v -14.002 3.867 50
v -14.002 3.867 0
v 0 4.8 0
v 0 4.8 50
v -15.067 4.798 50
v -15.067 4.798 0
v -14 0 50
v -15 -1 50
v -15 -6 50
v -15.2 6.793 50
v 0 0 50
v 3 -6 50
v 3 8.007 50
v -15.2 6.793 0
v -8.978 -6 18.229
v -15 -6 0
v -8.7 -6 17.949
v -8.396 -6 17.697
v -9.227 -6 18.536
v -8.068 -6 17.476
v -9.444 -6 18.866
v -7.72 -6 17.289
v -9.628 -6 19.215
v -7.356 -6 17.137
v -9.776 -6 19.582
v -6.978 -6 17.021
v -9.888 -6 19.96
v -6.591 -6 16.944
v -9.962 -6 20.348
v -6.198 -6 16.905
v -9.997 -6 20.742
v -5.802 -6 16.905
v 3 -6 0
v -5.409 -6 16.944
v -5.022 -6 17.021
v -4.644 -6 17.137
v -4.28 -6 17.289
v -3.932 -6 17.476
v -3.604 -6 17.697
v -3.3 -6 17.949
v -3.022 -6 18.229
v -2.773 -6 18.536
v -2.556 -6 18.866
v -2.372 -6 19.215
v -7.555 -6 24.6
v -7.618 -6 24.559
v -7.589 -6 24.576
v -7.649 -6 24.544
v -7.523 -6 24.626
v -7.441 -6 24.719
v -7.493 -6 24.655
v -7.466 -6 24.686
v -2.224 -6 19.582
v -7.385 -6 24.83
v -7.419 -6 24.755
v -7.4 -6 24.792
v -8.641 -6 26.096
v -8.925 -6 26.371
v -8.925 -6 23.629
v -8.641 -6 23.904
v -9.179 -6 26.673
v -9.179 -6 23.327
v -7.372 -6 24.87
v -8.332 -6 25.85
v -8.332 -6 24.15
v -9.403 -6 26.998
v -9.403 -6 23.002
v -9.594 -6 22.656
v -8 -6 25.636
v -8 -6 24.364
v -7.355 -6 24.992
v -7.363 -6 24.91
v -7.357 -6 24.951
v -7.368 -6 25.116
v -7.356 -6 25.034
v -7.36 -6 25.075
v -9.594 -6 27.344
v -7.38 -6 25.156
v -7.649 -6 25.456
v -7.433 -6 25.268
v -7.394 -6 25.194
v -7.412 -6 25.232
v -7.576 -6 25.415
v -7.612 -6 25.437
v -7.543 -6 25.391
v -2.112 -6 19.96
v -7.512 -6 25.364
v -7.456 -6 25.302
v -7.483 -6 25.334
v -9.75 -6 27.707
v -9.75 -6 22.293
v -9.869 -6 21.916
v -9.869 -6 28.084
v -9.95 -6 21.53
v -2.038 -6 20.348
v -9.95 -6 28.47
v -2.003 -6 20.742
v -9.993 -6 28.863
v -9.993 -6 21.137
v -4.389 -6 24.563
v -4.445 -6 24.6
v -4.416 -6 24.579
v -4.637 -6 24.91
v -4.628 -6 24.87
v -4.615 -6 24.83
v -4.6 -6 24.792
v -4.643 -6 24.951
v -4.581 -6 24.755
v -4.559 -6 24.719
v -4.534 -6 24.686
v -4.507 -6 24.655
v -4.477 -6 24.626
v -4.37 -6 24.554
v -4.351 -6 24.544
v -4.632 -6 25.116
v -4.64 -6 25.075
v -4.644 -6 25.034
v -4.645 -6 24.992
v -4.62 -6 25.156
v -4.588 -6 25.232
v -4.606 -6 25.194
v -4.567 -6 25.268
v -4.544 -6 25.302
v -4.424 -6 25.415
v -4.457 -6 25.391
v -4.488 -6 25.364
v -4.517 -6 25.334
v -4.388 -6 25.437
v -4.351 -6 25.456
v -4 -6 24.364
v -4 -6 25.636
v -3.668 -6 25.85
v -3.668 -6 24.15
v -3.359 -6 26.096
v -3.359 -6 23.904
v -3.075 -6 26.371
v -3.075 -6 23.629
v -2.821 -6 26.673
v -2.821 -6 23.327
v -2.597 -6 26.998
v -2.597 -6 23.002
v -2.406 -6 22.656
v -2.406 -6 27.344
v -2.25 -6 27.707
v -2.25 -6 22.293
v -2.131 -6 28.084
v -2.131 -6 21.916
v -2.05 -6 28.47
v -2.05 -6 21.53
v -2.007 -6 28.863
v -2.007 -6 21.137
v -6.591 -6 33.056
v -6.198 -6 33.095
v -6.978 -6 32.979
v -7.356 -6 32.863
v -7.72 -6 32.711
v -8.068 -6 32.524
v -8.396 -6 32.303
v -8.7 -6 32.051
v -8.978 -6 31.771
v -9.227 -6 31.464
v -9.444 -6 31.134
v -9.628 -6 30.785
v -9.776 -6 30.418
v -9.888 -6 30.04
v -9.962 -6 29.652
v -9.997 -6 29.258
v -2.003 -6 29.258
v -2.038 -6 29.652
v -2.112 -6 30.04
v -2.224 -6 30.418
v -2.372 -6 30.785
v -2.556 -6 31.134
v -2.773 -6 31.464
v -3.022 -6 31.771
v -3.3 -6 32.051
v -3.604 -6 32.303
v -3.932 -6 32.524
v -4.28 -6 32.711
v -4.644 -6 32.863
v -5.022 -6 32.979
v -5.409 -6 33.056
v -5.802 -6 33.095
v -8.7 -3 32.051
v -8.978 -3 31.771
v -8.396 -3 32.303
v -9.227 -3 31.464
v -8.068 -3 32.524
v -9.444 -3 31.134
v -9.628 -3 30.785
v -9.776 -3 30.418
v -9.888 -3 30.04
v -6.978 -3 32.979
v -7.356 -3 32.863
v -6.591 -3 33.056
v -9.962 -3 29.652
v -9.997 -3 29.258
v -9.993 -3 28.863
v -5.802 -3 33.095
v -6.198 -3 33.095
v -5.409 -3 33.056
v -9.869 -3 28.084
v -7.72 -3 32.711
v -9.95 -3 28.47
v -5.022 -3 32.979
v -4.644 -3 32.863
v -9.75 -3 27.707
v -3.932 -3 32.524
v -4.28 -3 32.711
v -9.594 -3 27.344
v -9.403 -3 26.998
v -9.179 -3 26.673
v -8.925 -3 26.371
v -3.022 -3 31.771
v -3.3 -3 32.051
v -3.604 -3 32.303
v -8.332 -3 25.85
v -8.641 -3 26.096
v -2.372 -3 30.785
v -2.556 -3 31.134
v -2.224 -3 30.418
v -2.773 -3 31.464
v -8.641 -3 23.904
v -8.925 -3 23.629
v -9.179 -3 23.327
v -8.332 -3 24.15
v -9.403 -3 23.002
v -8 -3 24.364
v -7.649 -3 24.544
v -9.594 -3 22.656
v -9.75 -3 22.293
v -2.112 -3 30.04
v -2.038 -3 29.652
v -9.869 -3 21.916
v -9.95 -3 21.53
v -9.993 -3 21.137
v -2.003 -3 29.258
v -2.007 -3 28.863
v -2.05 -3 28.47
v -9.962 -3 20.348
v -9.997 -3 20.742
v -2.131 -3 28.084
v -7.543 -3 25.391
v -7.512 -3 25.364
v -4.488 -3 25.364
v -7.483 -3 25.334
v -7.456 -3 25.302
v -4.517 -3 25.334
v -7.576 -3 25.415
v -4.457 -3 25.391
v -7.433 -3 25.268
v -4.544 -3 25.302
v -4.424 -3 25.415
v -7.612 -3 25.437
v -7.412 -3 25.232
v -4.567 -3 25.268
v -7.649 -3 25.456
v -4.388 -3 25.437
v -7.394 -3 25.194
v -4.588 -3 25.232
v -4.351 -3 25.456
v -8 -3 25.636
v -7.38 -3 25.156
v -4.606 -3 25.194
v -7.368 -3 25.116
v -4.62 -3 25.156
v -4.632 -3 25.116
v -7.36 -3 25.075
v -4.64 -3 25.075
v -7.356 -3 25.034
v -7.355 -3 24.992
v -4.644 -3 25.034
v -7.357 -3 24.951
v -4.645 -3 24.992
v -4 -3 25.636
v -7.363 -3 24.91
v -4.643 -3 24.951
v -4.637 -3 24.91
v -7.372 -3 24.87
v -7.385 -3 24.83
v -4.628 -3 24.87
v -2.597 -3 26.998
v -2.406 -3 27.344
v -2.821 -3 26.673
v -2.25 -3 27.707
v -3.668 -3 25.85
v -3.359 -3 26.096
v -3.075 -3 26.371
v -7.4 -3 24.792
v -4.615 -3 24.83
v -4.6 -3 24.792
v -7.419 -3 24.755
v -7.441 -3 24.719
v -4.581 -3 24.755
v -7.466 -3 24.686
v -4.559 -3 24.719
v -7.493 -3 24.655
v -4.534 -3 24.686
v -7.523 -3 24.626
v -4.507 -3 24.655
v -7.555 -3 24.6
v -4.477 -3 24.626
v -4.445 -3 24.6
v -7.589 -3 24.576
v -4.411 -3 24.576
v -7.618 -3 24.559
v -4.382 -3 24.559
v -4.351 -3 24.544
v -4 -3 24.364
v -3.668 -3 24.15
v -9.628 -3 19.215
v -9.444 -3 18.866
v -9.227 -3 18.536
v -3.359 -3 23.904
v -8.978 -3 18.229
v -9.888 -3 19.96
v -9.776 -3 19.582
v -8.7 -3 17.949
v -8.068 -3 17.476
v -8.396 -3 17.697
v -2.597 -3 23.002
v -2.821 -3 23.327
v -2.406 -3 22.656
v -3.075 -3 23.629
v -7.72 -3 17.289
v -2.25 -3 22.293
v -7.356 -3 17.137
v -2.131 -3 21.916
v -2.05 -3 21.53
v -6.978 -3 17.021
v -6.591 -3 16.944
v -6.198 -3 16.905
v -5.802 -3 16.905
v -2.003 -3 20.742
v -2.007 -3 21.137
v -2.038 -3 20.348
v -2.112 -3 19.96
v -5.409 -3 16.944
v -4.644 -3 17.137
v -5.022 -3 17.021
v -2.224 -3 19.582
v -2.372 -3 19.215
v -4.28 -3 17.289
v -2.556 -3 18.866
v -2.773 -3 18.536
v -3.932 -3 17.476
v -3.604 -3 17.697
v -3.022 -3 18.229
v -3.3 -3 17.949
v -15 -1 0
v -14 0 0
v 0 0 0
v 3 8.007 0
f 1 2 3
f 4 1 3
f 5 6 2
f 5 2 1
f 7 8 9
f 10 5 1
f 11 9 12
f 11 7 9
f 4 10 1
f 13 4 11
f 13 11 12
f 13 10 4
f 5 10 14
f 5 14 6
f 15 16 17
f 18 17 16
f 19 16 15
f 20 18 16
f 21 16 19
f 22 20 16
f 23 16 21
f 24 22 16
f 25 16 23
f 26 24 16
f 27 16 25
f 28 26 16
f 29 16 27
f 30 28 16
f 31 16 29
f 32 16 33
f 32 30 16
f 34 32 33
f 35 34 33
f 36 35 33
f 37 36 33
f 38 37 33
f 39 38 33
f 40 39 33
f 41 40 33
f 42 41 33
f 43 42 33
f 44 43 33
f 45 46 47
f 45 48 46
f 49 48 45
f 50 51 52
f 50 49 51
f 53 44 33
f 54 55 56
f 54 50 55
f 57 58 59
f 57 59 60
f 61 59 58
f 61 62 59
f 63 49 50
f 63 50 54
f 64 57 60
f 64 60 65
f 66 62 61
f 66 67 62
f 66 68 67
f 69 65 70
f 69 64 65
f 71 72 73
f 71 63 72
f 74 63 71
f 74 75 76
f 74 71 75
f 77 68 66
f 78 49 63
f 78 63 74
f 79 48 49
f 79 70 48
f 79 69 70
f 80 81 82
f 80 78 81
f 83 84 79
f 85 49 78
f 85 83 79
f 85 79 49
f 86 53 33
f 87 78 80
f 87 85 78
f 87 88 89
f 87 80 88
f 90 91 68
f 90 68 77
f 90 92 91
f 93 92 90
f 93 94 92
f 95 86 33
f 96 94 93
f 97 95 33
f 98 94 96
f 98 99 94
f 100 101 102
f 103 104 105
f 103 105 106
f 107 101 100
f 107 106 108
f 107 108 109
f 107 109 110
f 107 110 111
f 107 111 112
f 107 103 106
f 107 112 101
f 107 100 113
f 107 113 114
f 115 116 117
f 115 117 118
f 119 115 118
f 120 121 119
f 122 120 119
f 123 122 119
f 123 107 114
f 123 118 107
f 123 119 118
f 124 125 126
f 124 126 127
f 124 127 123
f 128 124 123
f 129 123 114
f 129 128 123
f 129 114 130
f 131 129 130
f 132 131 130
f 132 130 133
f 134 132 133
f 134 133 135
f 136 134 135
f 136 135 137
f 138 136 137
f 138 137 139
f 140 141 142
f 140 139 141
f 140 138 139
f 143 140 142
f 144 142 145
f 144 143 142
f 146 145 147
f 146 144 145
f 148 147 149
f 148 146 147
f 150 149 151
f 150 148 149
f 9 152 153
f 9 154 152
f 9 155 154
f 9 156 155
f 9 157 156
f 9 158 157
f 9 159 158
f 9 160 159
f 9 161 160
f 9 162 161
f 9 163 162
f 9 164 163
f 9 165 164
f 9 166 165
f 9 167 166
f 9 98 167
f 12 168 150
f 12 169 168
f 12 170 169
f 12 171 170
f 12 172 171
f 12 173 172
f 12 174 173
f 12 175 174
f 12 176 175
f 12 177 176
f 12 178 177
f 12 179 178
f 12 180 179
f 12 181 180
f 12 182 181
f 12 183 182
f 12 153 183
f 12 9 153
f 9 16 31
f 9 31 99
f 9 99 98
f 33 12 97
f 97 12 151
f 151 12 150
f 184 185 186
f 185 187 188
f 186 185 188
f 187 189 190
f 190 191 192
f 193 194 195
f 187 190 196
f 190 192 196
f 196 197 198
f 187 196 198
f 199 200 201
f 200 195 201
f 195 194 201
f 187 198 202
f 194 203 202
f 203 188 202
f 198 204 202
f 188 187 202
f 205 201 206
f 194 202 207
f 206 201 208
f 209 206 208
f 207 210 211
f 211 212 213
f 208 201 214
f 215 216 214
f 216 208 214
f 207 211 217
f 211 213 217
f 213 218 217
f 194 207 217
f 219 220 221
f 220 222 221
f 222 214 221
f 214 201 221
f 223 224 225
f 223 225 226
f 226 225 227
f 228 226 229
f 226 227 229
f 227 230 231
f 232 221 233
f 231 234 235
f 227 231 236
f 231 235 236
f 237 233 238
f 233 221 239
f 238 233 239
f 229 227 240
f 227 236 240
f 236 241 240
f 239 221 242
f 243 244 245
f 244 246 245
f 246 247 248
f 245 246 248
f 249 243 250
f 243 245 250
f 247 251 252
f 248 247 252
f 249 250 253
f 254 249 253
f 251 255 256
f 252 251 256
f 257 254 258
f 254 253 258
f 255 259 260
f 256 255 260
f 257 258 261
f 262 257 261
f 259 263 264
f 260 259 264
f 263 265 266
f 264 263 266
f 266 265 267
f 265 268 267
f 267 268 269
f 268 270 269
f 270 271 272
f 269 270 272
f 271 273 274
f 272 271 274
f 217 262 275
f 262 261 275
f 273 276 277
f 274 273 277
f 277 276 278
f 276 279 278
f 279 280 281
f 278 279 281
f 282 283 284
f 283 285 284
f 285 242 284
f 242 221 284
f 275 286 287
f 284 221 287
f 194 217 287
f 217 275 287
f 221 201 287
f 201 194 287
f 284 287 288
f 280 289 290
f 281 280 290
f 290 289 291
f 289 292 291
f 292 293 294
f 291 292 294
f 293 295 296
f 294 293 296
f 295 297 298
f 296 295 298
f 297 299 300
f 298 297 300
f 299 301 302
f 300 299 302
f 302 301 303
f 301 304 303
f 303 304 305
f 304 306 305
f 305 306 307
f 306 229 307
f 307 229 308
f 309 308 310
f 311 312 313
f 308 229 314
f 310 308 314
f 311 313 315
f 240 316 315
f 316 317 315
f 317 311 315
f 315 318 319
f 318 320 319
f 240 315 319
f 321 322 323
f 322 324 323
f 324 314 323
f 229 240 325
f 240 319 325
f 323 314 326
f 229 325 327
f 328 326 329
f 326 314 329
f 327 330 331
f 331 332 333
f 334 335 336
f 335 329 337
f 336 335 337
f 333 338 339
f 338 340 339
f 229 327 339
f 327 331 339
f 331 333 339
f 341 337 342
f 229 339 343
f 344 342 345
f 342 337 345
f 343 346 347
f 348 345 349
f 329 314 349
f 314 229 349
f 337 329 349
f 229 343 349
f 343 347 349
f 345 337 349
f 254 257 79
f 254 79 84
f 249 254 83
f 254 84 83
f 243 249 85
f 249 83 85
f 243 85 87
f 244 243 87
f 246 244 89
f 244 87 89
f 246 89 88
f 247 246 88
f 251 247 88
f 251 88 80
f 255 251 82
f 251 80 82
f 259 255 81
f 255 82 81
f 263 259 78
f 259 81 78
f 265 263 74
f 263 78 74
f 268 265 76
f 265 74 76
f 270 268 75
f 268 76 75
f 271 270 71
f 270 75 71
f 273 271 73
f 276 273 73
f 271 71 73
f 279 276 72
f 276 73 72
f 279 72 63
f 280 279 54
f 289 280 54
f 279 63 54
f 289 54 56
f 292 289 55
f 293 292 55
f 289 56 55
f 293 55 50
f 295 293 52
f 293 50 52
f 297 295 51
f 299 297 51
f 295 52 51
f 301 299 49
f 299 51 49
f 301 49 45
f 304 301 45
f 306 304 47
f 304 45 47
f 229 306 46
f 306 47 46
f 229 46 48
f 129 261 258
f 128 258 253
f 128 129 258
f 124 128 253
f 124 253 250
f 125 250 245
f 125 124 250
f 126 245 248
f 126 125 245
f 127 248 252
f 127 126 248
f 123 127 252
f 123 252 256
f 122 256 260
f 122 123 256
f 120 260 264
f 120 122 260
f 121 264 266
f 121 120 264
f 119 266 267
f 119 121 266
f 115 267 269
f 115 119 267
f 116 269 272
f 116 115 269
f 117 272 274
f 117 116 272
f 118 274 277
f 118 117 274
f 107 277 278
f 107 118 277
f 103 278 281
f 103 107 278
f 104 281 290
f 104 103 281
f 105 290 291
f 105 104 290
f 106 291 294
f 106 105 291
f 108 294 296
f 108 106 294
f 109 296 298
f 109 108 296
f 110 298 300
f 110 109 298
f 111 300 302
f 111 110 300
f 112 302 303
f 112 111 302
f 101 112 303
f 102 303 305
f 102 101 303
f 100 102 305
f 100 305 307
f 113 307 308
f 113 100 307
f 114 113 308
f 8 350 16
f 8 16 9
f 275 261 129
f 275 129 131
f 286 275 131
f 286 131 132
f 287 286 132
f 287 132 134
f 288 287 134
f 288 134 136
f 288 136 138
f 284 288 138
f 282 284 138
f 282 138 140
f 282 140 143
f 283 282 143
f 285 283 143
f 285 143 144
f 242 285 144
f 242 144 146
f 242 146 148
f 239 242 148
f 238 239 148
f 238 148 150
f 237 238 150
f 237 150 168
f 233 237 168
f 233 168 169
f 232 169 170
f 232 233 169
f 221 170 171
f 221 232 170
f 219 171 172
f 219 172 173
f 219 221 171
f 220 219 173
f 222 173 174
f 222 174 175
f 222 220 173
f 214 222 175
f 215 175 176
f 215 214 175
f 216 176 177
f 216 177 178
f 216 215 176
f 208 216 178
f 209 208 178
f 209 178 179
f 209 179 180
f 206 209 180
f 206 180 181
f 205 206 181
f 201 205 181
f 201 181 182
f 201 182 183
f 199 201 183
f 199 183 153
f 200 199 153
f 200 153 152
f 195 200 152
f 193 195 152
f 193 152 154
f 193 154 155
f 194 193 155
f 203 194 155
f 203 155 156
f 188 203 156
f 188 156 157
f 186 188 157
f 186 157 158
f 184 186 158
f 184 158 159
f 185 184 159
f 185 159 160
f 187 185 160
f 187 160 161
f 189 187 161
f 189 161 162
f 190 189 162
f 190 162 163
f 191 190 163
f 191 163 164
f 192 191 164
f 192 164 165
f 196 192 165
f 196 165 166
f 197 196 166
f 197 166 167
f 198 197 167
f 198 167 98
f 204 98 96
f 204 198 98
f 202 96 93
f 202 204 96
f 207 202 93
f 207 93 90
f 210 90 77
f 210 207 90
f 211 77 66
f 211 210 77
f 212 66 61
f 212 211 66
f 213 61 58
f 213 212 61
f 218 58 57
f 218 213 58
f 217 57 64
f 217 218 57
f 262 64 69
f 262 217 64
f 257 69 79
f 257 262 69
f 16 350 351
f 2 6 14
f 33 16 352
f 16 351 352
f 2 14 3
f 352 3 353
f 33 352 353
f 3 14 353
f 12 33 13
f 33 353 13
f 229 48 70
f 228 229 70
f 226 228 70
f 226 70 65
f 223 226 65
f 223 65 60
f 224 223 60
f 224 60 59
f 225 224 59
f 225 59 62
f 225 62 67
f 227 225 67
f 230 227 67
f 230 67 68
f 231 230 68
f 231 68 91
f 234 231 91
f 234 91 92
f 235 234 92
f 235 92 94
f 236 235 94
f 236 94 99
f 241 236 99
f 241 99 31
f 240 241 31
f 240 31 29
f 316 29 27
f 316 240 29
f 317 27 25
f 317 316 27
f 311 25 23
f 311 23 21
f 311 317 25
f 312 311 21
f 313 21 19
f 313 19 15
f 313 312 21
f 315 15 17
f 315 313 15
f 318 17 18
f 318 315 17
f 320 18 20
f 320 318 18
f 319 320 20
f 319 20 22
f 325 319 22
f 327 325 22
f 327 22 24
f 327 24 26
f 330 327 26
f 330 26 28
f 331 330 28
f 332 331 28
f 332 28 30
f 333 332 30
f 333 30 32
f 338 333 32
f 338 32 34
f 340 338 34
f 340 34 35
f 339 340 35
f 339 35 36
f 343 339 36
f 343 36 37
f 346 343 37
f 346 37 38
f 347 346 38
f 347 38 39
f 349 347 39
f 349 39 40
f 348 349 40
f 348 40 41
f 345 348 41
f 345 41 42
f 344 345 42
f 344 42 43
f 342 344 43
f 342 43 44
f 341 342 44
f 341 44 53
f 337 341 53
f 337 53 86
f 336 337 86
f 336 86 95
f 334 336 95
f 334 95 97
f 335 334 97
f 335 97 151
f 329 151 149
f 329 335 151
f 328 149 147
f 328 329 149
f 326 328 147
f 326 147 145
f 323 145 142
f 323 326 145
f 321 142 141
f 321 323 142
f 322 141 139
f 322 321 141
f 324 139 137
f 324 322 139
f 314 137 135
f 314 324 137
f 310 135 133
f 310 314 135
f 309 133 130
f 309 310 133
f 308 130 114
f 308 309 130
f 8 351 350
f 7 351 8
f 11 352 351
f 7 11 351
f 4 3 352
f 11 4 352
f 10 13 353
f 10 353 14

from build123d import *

# Parameters (mm, degrees)
BOSS_EXTRU_1_DEPTH = 50
ESQUISSE2_W        = 18
ESQUISSE2_H        = 50
BOSS_EXTRU_2_DEPTH = 3
CHANFREIN1_SIZE    = 1
CONG_1_R           = 0.5


with BuildPart() as part:
    # Esquisse1 → Boss.-Extru.1 (new body)
    with BuildSketch(Plane.XY):
        Polygon((0, 4.8), (0, 0), (-15, 0), (-15, -3), (3, -3), (3, 8.006659276), (-15.199557032, 6.793355474), (-15, 3.8), align=None)
    extrude(amount=BOSS_EXTRU_1_DEPTH)

    # Esquisse2 → Boss.-Extru.2 (add)
    with BuildSketch(Plane.XZ.offset(3)):
        with Locations((-6, 25)):
            Rectangle(ESQUISSE2_W, ESQUISSE2_H)
        with BuildLine():
            Line((-5.636810707, 25), (-4.842377656, 25.271173743))
            ThreePointArc((-4.842377656, 25.271173743), (-6, 33.1), (-7.157622344, 25.271173743))
            Line((-7.157622344, 25.271173743), (-6.363189293, 25))
            Line((-6.363189293, 25), (-7.157622344, 24.728826257))
            ThreePointArc((-7.157622344, 24.728826257), (-6, 16.9), (-4.842377656, 24.728826257))
            Line((-4.842377656, 24.728826257), (-5.636810707, 25))
        make_face(mode=Mode.SUBTRACT)
    extrude(amount=BOSS_EXTRU_2_DEPTH)

    # Chanfrein1
    chanfrein1_edges = [part.edges().sort_by_distance(p)[0] for p in [
        (-15, 3.8, 25),
        (-15, 0, 25),
    ]]
    chamfer(chanfrein1_edges, length=CHANFREIN1_SIZE)

    # Congé1
    cong_1_edges = [part.edges().sort_by_distance(p)[0] for p in [
        (-6.363189293, -4.5, 25),
        (-5.636810707, -4.5, 25),
    ]]
    fillet(cong_1_edges, radius=CONG_1_R)


solid = part.part
